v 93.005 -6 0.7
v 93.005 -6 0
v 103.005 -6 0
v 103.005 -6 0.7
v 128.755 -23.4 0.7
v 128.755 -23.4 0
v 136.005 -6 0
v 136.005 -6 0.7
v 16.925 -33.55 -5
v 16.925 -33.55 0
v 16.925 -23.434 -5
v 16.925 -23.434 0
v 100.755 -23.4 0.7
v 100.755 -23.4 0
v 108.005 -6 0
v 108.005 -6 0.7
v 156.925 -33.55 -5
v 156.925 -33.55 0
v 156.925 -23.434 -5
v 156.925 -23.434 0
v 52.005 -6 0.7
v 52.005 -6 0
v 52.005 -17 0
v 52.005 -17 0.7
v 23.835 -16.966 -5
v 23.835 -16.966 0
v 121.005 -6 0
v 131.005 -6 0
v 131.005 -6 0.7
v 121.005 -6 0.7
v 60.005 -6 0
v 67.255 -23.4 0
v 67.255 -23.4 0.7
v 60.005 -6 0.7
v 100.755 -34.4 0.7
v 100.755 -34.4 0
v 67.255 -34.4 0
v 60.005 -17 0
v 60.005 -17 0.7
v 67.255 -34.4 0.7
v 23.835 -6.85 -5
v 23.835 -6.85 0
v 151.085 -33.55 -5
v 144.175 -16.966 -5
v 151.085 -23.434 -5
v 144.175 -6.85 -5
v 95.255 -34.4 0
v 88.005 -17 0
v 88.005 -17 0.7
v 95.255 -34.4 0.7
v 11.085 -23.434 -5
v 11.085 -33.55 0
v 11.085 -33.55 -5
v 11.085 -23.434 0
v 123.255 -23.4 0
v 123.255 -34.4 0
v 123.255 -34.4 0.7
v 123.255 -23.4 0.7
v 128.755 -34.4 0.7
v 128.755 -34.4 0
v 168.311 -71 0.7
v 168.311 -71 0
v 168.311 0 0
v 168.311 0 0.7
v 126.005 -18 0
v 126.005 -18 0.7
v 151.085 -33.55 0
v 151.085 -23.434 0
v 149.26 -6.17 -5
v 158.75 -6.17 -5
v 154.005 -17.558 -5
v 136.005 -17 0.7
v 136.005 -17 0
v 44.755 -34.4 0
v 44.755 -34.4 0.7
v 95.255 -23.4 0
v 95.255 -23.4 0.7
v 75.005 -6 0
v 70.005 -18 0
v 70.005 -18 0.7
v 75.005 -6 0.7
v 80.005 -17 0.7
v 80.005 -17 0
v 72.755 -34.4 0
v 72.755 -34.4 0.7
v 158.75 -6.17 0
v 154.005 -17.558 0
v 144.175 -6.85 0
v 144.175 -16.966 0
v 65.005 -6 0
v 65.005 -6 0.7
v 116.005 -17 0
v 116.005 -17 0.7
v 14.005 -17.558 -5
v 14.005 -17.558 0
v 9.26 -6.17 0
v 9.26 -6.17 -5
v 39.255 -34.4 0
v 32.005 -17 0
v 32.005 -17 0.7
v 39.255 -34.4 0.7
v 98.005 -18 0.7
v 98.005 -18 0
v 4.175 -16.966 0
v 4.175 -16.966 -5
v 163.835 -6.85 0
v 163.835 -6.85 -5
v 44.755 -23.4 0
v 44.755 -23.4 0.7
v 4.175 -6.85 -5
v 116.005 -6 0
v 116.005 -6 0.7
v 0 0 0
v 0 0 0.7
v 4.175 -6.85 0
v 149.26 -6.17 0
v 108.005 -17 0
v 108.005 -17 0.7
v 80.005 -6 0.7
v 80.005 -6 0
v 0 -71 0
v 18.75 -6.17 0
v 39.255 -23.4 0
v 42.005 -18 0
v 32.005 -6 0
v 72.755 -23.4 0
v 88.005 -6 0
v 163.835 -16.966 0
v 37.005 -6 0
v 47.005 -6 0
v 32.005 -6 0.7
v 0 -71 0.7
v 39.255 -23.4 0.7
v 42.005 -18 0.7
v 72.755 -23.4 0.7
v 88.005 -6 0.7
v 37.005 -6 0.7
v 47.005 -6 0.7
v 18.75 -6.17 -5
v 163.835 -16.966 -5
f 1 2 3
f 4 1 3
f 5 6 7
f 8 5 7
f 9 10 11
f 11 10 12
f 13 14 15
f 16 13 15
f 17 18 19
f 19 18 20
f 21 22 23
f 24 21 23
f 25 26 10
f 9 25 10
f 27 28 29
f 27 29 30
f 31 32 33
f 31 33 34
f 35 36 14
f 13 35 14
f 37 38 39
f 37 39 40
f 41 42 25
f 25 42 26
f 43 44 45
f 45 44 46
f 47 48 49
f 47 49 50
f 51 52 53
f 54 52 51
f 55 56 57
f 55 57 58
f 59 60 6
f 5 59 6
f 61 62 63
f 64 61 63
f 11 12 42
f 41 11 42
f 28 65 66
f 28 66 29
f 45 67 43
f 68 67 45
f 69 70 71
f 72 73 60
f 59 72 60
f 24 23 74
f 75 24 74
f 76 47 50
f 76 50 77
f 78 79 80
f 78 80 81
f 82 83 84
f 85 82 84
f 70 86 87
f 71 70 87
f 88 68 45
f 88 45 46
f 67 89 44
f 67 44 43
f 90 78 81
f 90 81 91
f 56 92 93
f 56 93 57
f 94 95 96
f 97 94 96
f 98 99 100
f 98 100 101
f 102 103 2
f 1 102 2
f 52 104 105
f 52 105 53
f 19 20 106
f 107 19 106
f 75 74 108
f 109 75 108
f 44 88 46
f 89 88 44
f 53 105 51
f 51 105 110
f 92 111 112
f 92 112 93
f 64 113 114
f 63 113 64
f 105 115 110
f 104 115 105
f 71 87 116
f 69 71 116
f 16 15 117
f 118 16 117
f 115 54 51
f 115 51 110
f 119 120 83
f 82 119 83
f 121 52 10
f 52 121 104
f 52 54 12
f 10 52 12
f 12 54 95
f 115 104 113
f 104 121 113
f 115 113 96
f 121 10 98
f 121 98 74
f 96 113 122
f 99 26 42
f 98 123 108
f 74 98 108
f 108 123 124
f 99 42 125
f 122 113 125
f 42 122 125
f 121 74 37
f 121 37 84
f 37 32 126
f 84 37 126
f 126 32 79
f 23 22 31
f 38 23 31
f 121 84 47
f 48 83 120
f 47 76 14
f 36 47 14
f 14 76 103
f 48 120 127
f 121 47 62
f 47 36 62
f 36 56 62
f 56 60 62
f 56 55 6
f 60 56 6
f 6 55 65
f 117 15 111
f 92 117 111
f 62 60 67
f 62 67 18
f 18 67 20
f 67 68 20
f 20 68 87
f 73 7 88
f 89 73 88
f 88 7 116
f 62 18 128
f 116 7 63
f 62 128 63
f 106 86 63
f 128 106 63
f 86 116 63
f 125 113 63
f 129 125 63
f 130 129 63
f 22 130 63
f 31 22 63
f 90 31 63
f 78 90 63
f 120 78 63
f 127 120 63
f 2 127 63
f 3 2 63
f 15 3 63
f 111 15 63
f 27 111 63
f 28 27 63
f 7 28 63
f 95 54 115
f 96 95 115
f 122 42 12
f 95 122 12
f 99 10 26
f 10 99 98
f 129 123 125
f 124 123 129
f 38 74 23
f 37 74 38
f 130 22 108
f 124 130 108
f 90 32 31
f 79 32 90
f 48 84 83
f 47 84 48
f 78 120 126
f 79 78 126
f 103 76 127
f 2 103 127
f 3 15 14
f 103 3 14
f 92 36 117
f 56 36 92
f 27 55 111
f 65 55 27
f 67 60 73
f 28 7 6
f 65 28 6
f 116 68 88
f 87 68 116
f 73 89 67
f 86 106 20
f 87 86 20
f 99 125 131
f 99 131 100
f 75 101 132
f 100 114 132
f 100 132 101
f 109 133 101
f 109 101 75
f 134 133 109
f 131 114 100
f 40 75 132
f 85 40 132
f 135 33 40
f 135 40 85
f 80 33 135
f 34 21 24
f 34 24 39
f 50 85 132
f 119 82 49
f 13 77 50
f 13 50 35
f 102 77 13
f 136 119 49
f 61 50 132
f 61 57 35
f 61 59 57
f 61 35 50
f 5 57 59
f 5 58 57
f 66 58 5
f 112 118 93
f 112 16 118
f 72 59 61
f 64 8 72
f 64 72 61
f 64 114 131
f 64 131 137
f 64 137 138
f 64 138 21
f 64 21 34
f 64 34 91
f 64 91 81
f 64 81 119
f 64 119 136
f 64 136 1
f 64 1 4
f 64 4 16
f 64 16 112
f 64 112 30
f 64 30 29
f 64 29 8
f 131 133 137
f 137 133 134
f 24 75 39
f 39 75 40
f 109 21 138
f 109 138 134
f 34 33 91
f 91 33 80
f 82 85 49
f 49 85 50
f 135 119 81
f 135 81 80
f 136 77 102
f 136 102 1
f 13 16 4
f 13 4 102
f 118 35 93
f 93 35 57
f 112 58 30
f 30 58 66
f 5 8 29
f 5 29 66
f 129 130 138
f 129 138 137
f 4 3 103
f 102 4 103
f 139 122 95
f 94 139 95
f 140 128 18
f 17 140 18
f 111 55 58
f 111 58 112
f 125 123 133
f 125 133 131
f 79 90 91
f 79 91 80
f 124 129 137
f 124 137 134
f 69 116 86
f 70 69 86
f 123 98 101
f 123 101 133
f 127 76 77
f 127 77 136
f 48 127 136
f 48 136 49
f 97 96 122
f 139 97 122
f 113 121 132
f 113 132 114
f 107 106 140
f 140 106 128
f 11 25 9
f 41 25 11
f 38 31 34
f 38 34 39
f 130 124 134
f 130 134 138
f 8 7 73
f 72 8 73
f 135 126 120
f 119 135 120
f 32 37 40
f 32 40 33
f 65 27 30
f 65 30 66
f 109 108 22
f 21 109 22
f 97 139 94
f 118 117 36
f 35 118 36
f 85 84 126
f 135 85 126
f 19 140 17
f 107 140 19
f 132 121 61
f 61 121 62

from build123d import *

# Parameters (mm, degrees)
SKETCH2_W           = 168.310893
SKETCH2_H           = 71
BOSS_EXTRUDE3_DEPTH = 0.7
BOSS_EXTRUDE5_DEPTH = 5


with BuildPart() as part:
    # Sketch2 → Boss-Extrude3 (new body)
    with BuildSketch(Plane.XY):
        with Locations((84.1554465, -35.5)):
            Rectangle(SKETCH2_W, SKETCH2_H)
        Polygon((32.004849, -17), (32.004849, -11.5), (32.004849, -6), (39.254849, -23.4), (39.254849, -34.4), align=None, mode=Mode.SUBTRACT)
        Polygon((52.004849, -6), (52.004849, -17), (44.754849, -34.4), (44.754849, -23.4), align=None, mode=Mode.SUBTRACT)
        Polygon((67.254849, -34.4), (60.004849, -17), (60.004849, -6), (67.254849, -23.4), align=None, mode=Mode.SUBTRACT)
        Polygon((80.004849, -17), (72.754849, -34.4), (72.754849, -23.4), (80.004849, -6), align=None, mode=Mode.SUBTRACT)
        Polygon((42.004849, -18), (37.004849, -6), (47.004849, -6), align=None, mode=Mode.SUBTRACT)
        Polygon((75.004849, -6), (70.004849, -18), (65.004849, -6), align=None, mode=Mode.SUBTRACT)
        Polygon((95.254849, -23.4), (95.254849, -34.4), (88.004849, -17), (88.004849, -6), align=None, mode=Mode.SUBTRACT)
        Polygon((100.754849, -23.4), (108.004849, -6), (108.004849, -17), (100.754849, -34.4), align=None, mode=Mode.SUBTRACT)
        Polygon((123.254849, -34.4), (116.004849, -17), (116.004849, -6), (123.254849, -23.4), align=None, mode=Mode.SUBTRACT)
        Polygon((136.004849, -6), (136.004849, -17), (128.754849, -34.4), (128.754849, -23.4), align=None, mode=Mode.SUBTRACT)
        Polygon((98.004849, -18), (93.004849, -6), (103.004849, -6), align=None, mode=Mode.SUBTRACT)
        Polygon((131.004849, -6), (126.004849, -18), (121.004849, -6), align=None, mode=Mode.SUBTRACT)
    extrude(amount=BOSS_EXTRUDE3_DEPTH)

    # Sketch2<6> → Boss-Extrude5 (add)
    with BuildSketch(Plane.XY):
        Polygon((158.749849, -6.17), (149.259849, -6.17), (154.004849, -17.558), align=None)
        Polygon((144.174849, -16.966), (151.084849, -33.55), (151.084849, -23.434), (144.174849, -6.85), align=None)
        Polygon((163.834849, -6.85), (156.924849, -23.434), (156.924849, -33.55), (163.834849, -16.966), align=None)
        Polygon((18.749849, -6.17), (9.259849, -6.17), (14.004849, -17.558), align=None)
        Polygon((11.084849, -23.434), (4.174849, -6.85), (4.174849, -16.966), (11.084849, -33.55), align=None)
        Polygon((23.834849, -16.966), (23.834849, -6.85), (16.924849, -23.434), (16.924849, -33.55), align=None)
    extrude(amount=-BOSS_EXTRUDE5_DEPTH)


solid = part.part
